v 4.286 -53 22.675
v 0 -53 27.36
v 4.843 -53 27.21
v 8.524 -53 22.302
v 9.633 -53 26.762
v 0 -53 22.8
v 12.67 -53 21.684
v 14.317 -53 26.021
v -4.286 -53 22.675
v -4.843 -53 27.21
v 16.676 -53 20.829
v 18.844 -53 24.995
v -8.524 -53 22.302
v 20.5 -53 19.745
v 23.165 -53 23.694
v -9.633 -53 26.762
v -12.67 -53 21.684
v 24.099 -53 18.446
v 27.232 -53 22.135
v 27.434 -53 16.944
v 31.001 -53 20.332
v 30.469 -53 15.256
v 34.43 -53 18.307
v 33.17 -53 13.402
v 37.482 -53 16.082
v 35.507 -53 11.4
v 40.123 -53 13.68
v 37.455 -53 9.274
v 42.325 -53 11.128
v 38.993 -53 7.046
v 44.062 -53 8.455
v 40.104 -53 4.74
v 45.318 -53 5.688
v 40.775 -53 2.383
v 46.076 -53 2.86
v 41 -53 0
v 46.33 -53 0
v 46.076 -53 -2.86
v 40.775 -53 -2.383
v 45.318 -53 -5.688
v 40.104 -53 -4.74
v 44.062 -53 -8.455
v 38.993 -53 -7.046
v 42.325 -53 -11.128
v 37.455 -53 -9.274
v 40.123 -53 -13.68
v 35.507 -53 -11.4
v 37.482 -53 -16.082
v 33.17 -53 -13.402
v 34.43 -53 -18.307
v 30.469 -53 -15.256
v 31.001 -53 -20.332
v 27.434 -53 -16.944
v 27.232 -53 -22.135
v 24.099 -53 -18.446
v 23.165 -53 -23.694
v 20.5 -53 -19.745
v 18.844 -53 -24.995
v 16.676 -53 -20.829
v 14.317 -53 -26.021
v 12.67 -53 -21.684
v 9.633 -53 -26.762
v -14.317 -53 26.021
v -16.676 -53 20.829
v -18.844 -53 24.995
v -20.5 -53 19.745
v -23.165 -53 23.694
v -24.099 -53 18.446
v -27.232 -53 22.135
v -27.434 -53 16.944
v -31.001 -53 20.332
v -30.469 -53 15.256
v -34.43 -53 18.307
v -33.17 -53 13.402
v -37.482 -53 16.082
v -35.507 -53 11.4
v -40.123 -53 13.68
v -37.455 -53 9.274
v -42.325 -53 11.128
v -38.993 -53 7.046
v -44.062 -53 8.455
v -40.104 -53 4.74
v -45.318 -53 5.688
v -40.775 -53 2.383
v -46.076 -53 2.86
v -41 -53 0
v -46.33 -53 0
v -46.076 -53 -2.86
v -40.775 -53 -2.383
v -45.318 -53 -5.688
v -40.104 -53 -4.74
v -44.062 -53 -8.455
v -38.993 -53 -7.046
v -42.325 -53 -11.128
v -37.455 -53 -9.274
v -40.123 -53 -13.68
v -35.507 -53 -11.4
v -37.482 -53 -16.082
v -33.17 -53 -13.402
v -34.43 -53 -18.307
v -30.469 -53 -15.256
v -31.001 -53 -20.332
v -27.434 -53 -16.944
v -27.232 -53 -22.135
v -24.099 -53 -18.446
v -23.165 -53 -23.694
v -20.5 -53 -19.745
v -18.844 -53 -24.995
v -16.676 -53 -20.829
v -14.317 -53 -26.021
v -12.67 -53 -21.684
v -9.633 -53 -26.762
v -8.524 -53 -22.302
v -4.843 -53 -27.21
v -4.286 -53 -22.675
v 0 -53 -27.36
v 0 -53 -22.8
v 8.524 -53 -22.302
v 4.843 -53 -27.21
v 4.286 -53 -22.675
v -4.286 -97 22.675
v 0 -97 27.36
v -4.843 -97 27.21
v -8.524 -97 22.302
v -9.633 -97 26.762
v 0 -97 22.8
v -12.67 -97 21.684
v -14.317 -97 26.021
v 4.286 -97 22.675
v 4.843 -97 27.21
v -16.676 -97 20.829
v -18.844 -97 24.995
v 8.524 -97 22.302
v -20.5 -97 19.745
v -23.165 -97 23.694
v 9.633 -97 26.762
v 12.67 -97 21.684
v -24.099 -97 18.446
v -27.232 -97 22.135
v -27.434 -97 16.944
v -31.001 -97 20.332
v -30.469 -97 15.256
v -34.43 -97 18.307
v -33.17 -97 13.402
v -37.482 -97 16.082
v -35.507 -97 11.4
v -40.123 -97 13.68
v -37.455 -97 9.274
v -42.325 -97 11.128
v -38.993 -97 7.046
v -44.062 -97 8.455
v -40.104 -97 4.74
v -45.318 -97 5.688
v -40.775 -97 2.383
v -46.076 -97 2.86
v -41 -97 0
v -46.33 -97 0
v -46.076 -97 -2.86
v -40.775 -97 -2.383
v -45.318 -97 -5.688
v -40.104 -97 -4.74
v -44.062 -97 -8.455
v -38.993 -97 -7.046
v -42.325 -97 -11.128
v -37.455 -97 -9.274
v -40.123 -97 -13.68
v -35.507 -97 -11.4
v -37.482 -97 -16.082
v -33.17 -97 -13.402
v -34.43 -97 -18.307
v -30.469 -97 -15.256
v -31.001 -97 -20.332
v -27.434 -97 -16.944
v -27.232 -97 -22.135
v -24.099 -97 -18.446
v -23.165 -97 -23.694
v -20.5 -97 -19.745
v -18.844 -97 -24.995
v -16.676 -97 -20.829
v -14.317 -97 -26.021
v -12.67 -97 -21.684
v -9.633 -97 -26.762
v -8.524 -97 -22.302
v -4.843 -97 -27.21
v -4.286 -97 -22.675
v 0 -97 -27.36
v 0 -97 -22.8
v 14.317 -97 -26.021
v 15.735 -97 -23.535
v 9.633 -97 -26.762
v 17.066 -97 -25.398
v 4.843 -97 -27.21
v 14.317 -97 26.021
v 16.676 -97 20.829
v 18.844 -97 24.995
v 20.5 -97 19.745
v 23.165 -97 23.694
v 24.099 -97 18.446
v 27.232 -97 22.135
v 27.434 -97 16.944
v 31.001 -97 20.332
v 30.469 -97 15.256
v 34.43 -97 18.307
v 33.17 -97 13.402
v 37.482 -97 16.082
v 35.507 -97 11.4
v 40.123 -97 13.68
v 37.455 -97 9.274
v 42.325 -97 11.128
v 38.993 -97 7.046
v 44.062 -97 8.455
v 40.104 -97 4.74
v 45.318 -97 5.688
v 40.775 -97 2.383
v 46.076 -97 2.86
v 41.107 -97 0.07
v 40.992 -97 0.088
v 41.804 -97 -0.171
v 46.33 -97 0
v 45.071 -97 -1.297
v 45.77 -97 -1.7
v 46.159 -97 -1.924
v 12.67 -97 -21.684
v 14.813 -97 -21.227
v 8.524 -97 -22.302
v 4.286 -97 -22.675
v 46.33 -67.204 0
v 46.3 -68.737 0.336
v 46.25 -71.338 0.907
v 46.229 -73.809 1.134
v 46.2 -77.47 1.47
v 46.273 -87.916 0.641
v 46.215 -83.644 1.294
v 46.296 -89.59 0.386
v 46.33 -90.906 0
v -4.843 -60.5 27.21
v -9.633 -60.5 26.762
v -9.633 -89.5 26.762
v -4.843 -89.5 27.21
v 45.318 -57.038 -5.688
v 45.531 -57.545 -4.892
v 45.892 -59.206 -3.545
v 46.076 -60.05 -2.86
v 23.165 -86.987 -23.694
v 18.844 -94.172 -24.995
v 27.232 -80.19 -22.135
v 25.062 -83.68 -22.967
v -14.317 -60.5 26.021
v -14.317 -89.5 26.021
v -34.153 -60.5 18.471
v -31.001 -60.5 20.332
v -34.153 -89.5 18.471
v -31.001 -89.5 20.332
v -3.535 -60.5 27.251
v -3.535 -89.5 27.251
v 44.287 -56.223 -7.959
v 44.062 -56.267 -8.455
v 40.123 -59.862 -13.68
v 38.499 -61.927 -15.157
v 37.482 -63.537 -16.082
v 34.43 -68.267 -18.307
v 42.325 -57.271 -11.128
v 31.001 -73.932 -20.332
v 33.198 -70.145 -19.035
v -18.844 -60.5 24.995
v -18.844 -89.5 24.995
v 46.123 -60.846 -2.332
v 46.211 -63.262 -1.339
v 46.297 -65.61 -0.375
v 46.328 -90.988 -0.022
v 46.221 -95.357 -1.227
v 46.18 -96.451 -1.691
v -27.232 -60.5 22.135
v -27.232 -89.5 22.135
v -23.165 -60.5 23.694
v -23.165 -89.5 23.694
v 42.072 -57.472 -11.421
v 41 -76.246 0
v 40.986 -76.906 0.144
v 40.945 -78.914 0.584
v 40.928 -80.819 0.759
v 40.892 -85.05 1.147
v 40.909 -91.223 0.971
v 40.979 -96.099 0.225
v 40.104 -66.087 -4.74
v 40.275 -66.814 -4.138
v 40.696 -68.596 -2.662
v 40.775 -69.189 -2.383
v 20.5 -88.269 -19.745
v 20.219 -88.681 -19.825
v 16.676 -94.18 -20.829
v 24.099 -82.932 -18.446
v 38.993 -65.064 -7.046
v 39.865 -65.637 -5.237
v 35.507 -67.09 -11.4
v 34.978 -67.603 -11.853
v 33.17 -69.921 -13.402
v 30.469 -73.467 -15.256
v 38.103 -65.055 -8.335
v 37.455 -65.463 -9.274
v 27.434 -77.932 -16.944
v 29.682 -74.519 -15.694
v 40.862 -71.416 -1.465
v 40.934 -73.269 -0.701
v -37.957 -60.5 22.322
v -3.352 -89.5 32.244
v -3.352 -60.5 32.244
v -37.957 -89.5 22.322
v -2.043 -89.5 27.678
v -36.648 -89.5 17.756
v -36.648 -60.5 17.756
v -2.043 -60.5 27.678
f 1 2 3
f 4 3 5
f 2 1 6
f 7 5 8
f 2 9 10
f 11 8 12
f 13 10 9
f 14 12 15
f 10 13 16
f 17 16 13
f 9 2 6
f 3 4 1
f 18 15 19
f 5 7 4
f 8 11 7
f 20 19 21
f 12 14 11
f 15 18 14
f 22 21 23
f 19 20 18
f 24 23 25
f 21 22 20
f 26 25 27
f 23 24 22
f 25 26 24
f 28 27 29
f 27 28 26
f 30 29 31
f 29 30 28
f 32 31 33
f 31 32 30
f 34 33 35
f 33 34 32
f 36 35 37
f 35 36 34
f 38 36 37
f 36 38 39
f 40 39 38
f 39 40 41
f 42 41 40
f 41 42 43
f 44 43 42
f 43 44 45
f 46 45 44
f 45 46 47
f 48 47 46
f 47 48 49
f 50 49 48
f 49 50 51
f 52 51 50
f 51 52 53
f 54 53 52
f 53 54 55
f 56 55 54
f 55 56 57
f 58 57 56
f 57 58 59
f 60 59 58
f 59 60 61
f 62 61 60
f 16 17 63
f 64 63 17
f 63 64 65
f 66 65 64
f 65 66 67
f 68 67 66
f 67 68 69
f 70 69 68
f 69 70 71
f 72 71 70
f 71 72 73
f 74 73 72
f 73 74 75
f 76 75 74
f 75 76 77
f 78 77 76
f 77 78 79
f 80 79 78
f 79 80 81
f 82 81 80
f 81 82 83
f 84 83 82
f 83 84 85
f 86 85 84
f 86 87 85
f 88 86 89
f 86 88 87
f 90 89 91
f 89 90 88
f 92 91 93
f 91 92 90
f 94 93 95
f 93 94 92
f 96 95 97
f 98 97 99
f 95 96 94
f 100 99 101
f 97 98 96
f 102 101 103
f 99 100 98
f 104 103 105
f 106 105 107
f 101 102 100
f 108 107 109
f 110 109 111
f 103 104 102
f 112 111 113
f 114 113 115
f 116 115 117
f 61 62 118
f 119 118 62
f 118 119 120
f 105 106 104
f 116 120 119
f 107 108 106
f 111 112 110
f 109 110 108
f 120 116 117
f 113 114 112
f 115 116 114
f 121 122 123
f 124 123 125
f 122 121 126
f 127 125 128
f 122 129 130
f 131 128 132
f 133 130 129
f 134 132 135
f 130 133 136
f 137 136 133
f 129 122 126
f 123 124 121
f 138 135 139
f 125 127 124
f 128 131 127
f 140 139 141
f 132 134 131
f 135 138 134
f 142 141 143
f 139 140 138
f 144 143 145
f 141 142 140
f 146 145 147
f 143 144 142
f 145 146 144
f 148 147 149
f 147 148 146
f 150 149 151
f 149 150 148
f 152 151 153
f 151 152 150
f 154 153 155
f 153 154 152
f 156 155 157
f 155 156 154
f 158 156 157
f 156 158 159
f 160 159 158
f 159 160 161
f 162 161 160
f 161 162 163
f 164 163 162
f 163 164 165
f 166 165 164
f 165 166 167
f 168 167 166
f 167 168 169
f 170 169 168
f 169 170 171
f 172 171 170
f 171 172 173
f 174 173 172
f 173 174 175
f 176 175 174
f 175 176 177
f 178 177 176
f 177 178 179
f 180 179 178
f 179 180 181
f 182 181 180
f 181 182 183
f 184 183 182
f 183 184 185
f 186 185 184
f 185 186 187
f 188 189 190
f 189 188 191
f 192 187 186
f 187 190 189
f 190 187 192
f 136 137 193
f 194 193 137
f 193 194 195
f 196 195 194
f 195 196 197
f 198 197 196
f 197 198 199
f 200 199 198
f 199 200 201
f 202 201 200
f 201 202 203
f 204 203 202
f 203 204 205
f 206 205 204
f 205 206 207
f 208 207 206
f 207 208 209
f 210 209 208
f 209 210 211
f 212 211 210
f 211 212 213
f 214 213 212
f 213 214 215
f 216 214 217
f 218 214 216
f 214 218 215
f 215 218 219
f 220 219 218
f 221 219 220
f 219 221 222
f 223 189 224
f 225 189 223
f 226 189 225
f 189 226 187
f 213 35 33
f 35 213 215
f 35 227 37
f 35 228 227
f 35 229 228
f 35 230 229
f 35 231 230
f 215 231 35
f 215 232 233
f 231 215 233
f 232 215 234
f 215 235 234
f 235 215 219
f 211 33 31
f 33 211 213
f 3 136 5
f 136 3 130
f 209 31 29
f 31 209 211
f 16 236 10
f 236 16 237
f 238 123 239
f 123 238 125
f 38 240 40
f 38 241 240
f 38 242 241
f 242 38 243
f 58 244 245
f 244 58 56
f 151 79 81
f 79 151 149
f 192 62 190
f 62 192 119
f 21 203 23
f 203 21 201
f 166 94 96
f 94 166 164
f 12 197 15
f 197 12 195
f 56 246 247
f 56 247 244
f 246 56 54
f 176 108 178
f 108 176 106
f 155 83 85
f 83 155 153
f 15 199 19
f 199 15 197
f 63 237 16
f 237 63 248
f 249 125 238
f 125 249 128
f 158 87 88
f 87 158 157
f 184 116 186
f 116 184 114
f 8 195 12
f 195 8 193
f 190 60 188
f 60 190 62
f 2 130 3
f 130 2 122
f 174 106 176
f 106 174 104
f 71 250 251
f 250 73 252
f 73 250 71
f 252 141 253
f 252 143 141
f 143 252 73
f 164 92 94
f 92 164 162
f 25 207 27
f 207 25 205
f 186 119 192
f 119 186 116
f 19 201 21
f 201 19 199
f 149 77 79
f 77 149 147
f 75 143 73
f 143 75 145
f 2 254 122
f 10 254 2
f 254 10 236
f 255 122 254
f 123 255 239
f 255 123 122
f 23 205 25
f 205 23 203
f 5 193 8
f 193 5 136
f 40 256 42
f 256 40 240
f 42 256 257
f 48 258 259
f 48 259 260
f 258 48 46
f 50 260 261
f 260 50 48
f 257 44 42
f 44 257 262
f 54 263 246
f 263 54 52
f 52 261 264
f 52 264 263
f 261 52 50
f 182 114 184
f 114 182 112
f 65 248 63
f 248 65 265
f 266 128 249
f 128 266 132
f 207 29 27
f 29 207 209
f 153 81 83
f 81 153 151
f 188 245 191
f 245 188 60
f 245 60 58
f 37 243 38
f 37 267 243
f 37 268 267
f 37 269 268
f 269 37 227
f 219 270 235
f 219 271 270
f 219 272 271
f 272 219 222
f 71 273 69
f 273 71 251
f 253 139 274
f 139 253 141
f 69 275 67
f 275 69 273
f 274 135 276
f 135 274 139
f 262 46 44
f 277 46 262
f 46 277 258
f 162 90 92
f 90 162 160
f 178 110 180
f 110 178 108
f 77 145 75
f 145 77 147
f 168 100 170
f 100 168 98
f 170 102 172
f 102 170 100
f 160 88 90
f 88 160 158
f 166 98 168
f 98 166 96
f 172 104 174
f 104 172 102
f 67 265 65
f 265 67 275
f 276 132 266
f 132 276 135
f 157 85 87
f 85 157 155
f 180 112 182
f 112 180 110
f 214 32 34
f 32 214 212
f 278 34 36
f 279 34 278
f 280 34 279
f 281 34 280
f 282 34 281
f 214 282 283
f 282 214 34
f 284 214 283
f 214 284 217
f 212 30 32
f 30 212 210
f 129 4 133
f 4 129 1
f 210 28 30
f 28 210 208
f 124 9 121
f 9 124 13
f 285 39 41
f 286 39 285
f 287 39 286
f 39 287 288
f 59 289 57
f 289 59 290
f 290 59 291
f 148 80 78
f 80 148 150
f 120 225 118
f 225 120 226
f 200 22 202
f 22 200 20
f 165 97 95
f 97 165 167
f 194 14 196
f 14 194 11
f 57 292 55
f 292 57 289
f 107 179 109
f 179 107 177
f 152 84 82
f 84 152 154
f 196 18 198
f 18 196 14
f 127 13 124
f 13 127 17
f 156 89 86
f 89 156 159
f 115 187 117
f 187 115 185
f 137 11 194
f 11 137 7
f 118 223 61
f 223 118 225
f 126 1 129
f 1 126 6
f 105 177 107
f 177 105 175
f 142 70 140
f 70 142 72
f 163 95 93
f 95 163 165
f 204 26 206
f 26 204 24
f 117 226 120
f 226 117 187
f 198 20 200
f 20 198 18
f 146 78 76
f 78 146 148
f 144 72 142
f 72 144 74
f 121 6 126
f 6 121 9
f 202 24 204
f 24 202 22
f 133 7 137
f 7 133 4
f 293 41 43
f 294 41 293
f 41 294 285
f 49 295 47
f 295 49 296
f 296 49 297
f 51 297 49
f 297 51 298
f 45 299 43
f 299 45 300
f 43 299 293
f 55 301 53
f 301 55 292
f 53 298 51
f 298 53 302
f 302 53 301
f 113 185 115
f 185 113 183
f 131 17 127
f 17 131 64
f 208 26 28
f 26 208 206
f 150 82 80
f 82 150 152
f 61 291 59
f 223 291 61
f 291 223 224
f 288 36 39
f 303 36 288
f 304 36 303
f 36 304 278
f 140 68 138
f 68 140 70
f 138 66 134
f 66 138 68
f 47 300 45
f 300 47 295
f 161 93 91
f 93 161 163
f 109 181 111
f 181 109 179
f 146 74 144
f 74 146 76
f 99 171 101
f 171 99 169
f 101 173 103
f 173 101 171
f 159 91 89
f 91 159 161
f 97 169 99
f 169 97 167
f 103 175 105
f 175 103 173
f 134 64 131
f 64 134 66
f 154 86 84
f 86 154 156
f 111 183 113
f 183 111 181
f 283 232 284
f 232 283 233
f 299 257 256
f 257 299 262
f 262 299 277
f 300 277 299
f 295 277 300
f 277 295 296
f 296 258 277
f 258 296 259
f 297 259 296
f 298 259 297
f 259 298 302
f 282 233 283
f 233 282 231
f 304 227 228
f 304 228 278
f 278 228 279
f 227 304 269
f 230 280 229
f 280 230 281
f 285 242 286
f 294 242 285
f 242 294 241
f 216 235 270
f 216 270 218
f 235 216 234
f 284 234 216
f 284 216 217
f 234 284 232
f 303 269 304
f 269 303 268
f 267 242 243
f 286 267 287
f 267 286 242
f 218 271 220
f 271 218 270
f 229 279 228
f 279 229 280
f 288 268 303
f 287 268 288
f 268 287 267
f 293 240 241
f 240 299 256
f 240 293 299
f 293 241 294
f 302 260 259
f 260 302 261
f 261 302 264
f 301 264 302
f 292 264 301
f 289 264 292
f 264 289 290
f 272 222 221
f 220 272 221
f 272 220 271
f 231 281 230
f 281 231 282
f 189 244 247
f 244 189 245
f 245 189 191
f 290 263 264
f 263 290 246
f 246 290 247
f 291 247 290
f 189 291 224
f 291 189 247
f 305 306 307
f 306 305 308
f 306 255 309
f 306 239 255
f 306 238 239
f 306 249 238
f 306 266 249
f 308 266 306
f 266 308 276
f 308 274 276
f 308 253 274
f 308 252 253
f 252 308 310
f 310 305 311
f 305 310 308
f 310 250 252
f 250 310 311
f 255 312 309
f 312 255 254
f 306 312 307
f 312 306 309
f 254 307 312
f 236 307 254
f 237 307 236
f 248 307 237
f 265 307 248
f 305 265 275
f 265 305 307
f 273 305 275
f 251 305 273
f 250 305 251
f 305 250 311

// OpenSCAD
switchWidth = 13.9;
switchHeight = 13.9;
switchThickness = 11;

handWidth = 82;
handHeight = 40;
handThickness = 38;

bracketQuantity = 93;

featherHoleRadius = 1;



module thalfSockets(){
     cube([switchWidth, switchHeight, switchThickness],true);
     translate([switchWidth *1.5, -2,0]){ rotate([0,0,-13]){
	       cube([switchWidth, switchHeight, switchThickness],true);     
	  }
     }
}

module thumbSockets(){
     union(){
	  thalfSockets();
	  mirror([1,0,0]) thalfSockets();
     }
}

module thumbPlate(){
     intersection(){
	  difference(){
	       cube([65, 30, 3], true);
	       thumbSockets();
	  }
	  translate([0,-4,0]){
	       rotate([0,0,90]){ 
		    scale([1.2,2.75,1]){
			 cylinder(r = 13.5, h =4, center = true);
		    }
	       }
	  }
     }
}

module connectLoopPos(){
     intersection(){
	  cube([handWidth, handHeight+4, handThickness+6],true); 
	  rotate([90,0,0]){ 
	       scale([handWidth/handThickness,1,1.3]){ 
		    cylinder(h = handHeight, d = handThickness, center = true, $fn = 60);
	       }
	  }
     }
}

module connectLoopNeg(){
     translate([0, -20, 0]){
	  difference(){
	       scale([1.13, 1, 1.2]) connectLoopPos();
	       scale([1,3.1,1]) connectLoopPos();
	       translate([7,0.1,-(handThickness/2)]){
//		    cube([handWidth*.7,56,handThickness], true);
		    }
	  }
     }
}

module fingerSocketsPos(){
     thumbSockets();
     translate([-45,-20, 0]) rotate([0,0,12]) cube([switchWidth, switchHeight, switchThickness],true);
}

module featherPosts(){
     //when looking at board with the adafruit logo on bottom and usb port closest to yourself
     
     //bottom right
     translate([(0.45*25.4),-(0.9*25.4),-2]){cylinder(h = 4 ,r = featherHoleRadius, center = true);}
     //bottom left
     translate([-(0.45*25.4),-(0.9*25.4),-2]){cylinder(h = 4 ,r = featherHoleRadius, center = true);}
     //top right
     translate([(0.45*25.4),(0.9*25.4),-2]){cylinder(h = 4 ,r = featherHoleRadius, center = true);}
     //top left
     translate([-(0.45*25.4),(0.9*25.4),-2]){cylinder(h = 4 ,r = featherHoleRadius, center = true);}
}

module featherFootprint(){
     intersection(){  
	    union(){
		        difference(){
			         scale([1.3,1.3,1]){
				       cube([.9*25.4,2*25.4,13],true);
				           }
				     
				     translate([0,0,2.5]){
					   scale([1.2,1.2,1]){
						      cube([.9*25.4,2*25.4,13],true);
						       }
					       }

				         translate([14.5,0,-1]){
					       cube([2,13,1.5], true);
					           }
					     
					     translate([0,-30,-1]){
						   cube([12,8,8],true);
						       }
					         
					         translate([-(.46*25.4),25.4-(.42*25.4),-1]){
						       cube([10,10,10],true);
						           }
						        }
			  featherPosts();
			    }
	      rotate([0,90,0]){
		          scale([1,1.95,1]){
			           cylinder(r = ( 1.3* ((.9*25.4)/2)), h = (1.3*(2*25.4)), center = true);
				          }
			    }
     }
}

module batteryFootprint(){
     difference(){
	  translate([-2,2,-1]) scale([1.1,1.1,1.7]) cube([29,36,4.75]);
	  cube([29,36,4.75]);
	  
	  }
}

module fingerPlate1(){
     	  union(){
	       intersection(){
		    difference(){
			 translate([-12,-10,0]){
			      cube([90,45,3] , true );
			 }
			 //fingerSocketsPos();
		    }
		    translate([-38,-13,0]){ 
			 rotate([0,0,-50]) {
			      scale([1,1.75,1]) { 
				   cylinder(r = 13.5, h =4, center = true);
			      }
			 }
		    }
	       }
	       intersection(){
		    difference(){
			 translate([-12,-10,0]){ 
			      cube([90,45,3] , true );
			 }
			 //fingerSocketsPos();
		    }
		    translate([-4.5,-5,0]){ 
			 rotate([0,0,97]){
			      scale([1.3,2.95,1]){
				   {
					cylinder(r = 13.5, h =3, center = true);
				   }	   
			      }
			 }
			 
		    }
	       }
	  }
}

module fingerPlate0(){
     	  union(){
	       intersection(){
		    difference(){
			 translate([-12,-10,0]){
			      cube([90,45,3] , true );
			 }
			 fingerSocketsPos();
		    }
		    translate([-38,-13,0]){ 
			 rotate([0,0,-50]) {
			      scale([1,1.75,1]) { 
				   cylinder(r = 13.5, h =4, center = true);
			      }
			 }
		    }
	       }
	       intersection(){
		    difference(){
			 translate([-12,-10,0]){ 
			      cube([90,45,3] , true );
			 }
			 fingerSocketsPos();
		    }
		    translate([-4.5,-5,0]){ 
			 rotate([0,0,97]){
			      scale([1.3,2.95,1]){
				   {
					cylinder(r = 13.5, h =3, center = true);
				   }	   
			      }
			 }
			 
		    }
	       }
	  }
}

module fingerBucket(){
     union(){
	  scale([1,1,4]){ 
	       fingerPlate();
	       }
	  translate([-38,-13,-4.5]){
	       rotate([0,0,-50]){ 
		    scale([1,1.75,1]){
			 {
			      cylinder(r = 13.5, h =3, center = true);
			 }
		    }
	       }
	  }
	  translate([30,8.3,0]){ 
	       rotate([0,0,97]){ 
		    scale([1.3,2.95,1]){ 
			 cylinder(r = 13.5, h =3, center = true);
		    }
	       }
	  }
     }
}


module fingerBucketR1(){
     translate([0,0,5]){    
	  scale([1,1,3]){
	       union(){
		    intersection(){
			 difference(){
		      translate([-12,-10,0]){
				   cube([90,45,3] , true );
			      }
			      fingerSocketsPos();
			 }
			 translate([-38,-13,0]){ 
			      rotate([0,0,-50]) {
				   scale([1,1.75,1]) { 
					cylinder(r = 13.5, h =4, center = true);
				   }
			      }
			 }
		    }
		    intersection(){
			 difference(){
			      translate([-12,-10,0]){ 
				   cube([90,45,3] , true );
			      }
			      fingerSocketsPos();
			 }
			 translate([-4.5,-5,0]){ 
			      rotate([0,0,97]){
				   scale([1.3,2.95,1]){
					{
					     cylinder(r = 13.5, h =3, center = true);
					}	   
				   }
			      }
			      
			 }
		    }
	       }
	  }
     }
}


module fingerBucketR0(){
     union(){
	  difference(){
	       fingerBucketR1();
	       translate([-15,-8,3]){
		    rotate([0,90,20]){
			 cylinder(r=2,h=75,$fn=8,center = true);
		    }
	       }
	  }
	  fingerPlate1();
     }
}

module thumbBucket(){
     union(){
	  scale([1,1,4]){
	       thumbPlate();
	  }
	  translate([0,-4,-5]){
	       intersection(){
		    rotate([0,0,90]){ 
			 scale([1.2,2.75,1]){
			      cylinder(r = 13.5, h =4, center = true);
			 }
		    }
		    cube([65, 22, 3], true);
	       }
	  }
     }
}

module thumbBucketR(){
     difference(){
	  thumbBucket();
	  translate([0,0,-2]){
	       rotate([0,90,0]){
		    cylinder(r=3, h=35, center = true);
	       }
	  }
     }
}


module supportL(){
     cube(5);
}

module supportR(){
}


module mountingBrackets(bracketHeight){
     for(i = [0:bracketQuantity]){
	       difference(){
		    cylinder(h=i,d = 8,center = true);
		    rotate([90,0,0]){
			 cylinder(r=2,h=i+2,center = true);
			 {
			 }
		    }
	       }
     } 
}


//MODULE FOR LEFT ARM ULNAL SIDE CONNECTION LOOP



//handbrace w/Thumb hole
module connectLoopR0(){
     difference(){
	  translate([0,-55,0]){
	      scale([1,1,1.2]){ 
		   connectLoopNeg();
	      }
	  }
	  translate([55,-68,-15]){
	       rotate([92,0,-35]){
		    cylinder(h=95,d=34,center=true);
	       }
	  }
     }
}


module wireRoute1(){     difference(){
	  cylinder(r=3.4, h=20, center= true);
	  cylinder(h = 50, r = 3, center = true);
     }
}

module wireRoute0(){
	  cylinder(h = 20, r = 3, center = true);
     
}
//RENDERS
// FINAL RENDER
//this final render will be specially structured as such 
//union(){..translate(){moduleName(); .. translate(){moduleName();}.... repeat as needed... }}

//difference(){
connectLoopR0();
translate([-20,-75,25]) rotate([-16,0,90]) cube([29,36,4.75], center = true);
//}

//Create Cover & forge + Import Gerudo script


/*
difference(){
     // rotate([90,0,0]){
     translate([0,95,20]){
	  finalHandBase();
     }
     translate([-55,-80,80]){
//cube([120,120,120]);
}
translate([-55,-80,40]){
//	  cube([125,125,40]);
}
translate([-55,-80,-80]){
//	  cube([120,120,120]);
}
}
/*
module knifeSlice0(){
     difference(){
	  connectLoopR0();
	  translate([0,-13,-50]){
	       cube([150,150,150],true);
	  }
     }


module knifeSlice1(){
     difference(){connectLoopR0();
	  translate([-50,-130,-25]) cube([150,50,50]);
     }
}

knifeSlice0();
*/

//connectLoopNeg();
